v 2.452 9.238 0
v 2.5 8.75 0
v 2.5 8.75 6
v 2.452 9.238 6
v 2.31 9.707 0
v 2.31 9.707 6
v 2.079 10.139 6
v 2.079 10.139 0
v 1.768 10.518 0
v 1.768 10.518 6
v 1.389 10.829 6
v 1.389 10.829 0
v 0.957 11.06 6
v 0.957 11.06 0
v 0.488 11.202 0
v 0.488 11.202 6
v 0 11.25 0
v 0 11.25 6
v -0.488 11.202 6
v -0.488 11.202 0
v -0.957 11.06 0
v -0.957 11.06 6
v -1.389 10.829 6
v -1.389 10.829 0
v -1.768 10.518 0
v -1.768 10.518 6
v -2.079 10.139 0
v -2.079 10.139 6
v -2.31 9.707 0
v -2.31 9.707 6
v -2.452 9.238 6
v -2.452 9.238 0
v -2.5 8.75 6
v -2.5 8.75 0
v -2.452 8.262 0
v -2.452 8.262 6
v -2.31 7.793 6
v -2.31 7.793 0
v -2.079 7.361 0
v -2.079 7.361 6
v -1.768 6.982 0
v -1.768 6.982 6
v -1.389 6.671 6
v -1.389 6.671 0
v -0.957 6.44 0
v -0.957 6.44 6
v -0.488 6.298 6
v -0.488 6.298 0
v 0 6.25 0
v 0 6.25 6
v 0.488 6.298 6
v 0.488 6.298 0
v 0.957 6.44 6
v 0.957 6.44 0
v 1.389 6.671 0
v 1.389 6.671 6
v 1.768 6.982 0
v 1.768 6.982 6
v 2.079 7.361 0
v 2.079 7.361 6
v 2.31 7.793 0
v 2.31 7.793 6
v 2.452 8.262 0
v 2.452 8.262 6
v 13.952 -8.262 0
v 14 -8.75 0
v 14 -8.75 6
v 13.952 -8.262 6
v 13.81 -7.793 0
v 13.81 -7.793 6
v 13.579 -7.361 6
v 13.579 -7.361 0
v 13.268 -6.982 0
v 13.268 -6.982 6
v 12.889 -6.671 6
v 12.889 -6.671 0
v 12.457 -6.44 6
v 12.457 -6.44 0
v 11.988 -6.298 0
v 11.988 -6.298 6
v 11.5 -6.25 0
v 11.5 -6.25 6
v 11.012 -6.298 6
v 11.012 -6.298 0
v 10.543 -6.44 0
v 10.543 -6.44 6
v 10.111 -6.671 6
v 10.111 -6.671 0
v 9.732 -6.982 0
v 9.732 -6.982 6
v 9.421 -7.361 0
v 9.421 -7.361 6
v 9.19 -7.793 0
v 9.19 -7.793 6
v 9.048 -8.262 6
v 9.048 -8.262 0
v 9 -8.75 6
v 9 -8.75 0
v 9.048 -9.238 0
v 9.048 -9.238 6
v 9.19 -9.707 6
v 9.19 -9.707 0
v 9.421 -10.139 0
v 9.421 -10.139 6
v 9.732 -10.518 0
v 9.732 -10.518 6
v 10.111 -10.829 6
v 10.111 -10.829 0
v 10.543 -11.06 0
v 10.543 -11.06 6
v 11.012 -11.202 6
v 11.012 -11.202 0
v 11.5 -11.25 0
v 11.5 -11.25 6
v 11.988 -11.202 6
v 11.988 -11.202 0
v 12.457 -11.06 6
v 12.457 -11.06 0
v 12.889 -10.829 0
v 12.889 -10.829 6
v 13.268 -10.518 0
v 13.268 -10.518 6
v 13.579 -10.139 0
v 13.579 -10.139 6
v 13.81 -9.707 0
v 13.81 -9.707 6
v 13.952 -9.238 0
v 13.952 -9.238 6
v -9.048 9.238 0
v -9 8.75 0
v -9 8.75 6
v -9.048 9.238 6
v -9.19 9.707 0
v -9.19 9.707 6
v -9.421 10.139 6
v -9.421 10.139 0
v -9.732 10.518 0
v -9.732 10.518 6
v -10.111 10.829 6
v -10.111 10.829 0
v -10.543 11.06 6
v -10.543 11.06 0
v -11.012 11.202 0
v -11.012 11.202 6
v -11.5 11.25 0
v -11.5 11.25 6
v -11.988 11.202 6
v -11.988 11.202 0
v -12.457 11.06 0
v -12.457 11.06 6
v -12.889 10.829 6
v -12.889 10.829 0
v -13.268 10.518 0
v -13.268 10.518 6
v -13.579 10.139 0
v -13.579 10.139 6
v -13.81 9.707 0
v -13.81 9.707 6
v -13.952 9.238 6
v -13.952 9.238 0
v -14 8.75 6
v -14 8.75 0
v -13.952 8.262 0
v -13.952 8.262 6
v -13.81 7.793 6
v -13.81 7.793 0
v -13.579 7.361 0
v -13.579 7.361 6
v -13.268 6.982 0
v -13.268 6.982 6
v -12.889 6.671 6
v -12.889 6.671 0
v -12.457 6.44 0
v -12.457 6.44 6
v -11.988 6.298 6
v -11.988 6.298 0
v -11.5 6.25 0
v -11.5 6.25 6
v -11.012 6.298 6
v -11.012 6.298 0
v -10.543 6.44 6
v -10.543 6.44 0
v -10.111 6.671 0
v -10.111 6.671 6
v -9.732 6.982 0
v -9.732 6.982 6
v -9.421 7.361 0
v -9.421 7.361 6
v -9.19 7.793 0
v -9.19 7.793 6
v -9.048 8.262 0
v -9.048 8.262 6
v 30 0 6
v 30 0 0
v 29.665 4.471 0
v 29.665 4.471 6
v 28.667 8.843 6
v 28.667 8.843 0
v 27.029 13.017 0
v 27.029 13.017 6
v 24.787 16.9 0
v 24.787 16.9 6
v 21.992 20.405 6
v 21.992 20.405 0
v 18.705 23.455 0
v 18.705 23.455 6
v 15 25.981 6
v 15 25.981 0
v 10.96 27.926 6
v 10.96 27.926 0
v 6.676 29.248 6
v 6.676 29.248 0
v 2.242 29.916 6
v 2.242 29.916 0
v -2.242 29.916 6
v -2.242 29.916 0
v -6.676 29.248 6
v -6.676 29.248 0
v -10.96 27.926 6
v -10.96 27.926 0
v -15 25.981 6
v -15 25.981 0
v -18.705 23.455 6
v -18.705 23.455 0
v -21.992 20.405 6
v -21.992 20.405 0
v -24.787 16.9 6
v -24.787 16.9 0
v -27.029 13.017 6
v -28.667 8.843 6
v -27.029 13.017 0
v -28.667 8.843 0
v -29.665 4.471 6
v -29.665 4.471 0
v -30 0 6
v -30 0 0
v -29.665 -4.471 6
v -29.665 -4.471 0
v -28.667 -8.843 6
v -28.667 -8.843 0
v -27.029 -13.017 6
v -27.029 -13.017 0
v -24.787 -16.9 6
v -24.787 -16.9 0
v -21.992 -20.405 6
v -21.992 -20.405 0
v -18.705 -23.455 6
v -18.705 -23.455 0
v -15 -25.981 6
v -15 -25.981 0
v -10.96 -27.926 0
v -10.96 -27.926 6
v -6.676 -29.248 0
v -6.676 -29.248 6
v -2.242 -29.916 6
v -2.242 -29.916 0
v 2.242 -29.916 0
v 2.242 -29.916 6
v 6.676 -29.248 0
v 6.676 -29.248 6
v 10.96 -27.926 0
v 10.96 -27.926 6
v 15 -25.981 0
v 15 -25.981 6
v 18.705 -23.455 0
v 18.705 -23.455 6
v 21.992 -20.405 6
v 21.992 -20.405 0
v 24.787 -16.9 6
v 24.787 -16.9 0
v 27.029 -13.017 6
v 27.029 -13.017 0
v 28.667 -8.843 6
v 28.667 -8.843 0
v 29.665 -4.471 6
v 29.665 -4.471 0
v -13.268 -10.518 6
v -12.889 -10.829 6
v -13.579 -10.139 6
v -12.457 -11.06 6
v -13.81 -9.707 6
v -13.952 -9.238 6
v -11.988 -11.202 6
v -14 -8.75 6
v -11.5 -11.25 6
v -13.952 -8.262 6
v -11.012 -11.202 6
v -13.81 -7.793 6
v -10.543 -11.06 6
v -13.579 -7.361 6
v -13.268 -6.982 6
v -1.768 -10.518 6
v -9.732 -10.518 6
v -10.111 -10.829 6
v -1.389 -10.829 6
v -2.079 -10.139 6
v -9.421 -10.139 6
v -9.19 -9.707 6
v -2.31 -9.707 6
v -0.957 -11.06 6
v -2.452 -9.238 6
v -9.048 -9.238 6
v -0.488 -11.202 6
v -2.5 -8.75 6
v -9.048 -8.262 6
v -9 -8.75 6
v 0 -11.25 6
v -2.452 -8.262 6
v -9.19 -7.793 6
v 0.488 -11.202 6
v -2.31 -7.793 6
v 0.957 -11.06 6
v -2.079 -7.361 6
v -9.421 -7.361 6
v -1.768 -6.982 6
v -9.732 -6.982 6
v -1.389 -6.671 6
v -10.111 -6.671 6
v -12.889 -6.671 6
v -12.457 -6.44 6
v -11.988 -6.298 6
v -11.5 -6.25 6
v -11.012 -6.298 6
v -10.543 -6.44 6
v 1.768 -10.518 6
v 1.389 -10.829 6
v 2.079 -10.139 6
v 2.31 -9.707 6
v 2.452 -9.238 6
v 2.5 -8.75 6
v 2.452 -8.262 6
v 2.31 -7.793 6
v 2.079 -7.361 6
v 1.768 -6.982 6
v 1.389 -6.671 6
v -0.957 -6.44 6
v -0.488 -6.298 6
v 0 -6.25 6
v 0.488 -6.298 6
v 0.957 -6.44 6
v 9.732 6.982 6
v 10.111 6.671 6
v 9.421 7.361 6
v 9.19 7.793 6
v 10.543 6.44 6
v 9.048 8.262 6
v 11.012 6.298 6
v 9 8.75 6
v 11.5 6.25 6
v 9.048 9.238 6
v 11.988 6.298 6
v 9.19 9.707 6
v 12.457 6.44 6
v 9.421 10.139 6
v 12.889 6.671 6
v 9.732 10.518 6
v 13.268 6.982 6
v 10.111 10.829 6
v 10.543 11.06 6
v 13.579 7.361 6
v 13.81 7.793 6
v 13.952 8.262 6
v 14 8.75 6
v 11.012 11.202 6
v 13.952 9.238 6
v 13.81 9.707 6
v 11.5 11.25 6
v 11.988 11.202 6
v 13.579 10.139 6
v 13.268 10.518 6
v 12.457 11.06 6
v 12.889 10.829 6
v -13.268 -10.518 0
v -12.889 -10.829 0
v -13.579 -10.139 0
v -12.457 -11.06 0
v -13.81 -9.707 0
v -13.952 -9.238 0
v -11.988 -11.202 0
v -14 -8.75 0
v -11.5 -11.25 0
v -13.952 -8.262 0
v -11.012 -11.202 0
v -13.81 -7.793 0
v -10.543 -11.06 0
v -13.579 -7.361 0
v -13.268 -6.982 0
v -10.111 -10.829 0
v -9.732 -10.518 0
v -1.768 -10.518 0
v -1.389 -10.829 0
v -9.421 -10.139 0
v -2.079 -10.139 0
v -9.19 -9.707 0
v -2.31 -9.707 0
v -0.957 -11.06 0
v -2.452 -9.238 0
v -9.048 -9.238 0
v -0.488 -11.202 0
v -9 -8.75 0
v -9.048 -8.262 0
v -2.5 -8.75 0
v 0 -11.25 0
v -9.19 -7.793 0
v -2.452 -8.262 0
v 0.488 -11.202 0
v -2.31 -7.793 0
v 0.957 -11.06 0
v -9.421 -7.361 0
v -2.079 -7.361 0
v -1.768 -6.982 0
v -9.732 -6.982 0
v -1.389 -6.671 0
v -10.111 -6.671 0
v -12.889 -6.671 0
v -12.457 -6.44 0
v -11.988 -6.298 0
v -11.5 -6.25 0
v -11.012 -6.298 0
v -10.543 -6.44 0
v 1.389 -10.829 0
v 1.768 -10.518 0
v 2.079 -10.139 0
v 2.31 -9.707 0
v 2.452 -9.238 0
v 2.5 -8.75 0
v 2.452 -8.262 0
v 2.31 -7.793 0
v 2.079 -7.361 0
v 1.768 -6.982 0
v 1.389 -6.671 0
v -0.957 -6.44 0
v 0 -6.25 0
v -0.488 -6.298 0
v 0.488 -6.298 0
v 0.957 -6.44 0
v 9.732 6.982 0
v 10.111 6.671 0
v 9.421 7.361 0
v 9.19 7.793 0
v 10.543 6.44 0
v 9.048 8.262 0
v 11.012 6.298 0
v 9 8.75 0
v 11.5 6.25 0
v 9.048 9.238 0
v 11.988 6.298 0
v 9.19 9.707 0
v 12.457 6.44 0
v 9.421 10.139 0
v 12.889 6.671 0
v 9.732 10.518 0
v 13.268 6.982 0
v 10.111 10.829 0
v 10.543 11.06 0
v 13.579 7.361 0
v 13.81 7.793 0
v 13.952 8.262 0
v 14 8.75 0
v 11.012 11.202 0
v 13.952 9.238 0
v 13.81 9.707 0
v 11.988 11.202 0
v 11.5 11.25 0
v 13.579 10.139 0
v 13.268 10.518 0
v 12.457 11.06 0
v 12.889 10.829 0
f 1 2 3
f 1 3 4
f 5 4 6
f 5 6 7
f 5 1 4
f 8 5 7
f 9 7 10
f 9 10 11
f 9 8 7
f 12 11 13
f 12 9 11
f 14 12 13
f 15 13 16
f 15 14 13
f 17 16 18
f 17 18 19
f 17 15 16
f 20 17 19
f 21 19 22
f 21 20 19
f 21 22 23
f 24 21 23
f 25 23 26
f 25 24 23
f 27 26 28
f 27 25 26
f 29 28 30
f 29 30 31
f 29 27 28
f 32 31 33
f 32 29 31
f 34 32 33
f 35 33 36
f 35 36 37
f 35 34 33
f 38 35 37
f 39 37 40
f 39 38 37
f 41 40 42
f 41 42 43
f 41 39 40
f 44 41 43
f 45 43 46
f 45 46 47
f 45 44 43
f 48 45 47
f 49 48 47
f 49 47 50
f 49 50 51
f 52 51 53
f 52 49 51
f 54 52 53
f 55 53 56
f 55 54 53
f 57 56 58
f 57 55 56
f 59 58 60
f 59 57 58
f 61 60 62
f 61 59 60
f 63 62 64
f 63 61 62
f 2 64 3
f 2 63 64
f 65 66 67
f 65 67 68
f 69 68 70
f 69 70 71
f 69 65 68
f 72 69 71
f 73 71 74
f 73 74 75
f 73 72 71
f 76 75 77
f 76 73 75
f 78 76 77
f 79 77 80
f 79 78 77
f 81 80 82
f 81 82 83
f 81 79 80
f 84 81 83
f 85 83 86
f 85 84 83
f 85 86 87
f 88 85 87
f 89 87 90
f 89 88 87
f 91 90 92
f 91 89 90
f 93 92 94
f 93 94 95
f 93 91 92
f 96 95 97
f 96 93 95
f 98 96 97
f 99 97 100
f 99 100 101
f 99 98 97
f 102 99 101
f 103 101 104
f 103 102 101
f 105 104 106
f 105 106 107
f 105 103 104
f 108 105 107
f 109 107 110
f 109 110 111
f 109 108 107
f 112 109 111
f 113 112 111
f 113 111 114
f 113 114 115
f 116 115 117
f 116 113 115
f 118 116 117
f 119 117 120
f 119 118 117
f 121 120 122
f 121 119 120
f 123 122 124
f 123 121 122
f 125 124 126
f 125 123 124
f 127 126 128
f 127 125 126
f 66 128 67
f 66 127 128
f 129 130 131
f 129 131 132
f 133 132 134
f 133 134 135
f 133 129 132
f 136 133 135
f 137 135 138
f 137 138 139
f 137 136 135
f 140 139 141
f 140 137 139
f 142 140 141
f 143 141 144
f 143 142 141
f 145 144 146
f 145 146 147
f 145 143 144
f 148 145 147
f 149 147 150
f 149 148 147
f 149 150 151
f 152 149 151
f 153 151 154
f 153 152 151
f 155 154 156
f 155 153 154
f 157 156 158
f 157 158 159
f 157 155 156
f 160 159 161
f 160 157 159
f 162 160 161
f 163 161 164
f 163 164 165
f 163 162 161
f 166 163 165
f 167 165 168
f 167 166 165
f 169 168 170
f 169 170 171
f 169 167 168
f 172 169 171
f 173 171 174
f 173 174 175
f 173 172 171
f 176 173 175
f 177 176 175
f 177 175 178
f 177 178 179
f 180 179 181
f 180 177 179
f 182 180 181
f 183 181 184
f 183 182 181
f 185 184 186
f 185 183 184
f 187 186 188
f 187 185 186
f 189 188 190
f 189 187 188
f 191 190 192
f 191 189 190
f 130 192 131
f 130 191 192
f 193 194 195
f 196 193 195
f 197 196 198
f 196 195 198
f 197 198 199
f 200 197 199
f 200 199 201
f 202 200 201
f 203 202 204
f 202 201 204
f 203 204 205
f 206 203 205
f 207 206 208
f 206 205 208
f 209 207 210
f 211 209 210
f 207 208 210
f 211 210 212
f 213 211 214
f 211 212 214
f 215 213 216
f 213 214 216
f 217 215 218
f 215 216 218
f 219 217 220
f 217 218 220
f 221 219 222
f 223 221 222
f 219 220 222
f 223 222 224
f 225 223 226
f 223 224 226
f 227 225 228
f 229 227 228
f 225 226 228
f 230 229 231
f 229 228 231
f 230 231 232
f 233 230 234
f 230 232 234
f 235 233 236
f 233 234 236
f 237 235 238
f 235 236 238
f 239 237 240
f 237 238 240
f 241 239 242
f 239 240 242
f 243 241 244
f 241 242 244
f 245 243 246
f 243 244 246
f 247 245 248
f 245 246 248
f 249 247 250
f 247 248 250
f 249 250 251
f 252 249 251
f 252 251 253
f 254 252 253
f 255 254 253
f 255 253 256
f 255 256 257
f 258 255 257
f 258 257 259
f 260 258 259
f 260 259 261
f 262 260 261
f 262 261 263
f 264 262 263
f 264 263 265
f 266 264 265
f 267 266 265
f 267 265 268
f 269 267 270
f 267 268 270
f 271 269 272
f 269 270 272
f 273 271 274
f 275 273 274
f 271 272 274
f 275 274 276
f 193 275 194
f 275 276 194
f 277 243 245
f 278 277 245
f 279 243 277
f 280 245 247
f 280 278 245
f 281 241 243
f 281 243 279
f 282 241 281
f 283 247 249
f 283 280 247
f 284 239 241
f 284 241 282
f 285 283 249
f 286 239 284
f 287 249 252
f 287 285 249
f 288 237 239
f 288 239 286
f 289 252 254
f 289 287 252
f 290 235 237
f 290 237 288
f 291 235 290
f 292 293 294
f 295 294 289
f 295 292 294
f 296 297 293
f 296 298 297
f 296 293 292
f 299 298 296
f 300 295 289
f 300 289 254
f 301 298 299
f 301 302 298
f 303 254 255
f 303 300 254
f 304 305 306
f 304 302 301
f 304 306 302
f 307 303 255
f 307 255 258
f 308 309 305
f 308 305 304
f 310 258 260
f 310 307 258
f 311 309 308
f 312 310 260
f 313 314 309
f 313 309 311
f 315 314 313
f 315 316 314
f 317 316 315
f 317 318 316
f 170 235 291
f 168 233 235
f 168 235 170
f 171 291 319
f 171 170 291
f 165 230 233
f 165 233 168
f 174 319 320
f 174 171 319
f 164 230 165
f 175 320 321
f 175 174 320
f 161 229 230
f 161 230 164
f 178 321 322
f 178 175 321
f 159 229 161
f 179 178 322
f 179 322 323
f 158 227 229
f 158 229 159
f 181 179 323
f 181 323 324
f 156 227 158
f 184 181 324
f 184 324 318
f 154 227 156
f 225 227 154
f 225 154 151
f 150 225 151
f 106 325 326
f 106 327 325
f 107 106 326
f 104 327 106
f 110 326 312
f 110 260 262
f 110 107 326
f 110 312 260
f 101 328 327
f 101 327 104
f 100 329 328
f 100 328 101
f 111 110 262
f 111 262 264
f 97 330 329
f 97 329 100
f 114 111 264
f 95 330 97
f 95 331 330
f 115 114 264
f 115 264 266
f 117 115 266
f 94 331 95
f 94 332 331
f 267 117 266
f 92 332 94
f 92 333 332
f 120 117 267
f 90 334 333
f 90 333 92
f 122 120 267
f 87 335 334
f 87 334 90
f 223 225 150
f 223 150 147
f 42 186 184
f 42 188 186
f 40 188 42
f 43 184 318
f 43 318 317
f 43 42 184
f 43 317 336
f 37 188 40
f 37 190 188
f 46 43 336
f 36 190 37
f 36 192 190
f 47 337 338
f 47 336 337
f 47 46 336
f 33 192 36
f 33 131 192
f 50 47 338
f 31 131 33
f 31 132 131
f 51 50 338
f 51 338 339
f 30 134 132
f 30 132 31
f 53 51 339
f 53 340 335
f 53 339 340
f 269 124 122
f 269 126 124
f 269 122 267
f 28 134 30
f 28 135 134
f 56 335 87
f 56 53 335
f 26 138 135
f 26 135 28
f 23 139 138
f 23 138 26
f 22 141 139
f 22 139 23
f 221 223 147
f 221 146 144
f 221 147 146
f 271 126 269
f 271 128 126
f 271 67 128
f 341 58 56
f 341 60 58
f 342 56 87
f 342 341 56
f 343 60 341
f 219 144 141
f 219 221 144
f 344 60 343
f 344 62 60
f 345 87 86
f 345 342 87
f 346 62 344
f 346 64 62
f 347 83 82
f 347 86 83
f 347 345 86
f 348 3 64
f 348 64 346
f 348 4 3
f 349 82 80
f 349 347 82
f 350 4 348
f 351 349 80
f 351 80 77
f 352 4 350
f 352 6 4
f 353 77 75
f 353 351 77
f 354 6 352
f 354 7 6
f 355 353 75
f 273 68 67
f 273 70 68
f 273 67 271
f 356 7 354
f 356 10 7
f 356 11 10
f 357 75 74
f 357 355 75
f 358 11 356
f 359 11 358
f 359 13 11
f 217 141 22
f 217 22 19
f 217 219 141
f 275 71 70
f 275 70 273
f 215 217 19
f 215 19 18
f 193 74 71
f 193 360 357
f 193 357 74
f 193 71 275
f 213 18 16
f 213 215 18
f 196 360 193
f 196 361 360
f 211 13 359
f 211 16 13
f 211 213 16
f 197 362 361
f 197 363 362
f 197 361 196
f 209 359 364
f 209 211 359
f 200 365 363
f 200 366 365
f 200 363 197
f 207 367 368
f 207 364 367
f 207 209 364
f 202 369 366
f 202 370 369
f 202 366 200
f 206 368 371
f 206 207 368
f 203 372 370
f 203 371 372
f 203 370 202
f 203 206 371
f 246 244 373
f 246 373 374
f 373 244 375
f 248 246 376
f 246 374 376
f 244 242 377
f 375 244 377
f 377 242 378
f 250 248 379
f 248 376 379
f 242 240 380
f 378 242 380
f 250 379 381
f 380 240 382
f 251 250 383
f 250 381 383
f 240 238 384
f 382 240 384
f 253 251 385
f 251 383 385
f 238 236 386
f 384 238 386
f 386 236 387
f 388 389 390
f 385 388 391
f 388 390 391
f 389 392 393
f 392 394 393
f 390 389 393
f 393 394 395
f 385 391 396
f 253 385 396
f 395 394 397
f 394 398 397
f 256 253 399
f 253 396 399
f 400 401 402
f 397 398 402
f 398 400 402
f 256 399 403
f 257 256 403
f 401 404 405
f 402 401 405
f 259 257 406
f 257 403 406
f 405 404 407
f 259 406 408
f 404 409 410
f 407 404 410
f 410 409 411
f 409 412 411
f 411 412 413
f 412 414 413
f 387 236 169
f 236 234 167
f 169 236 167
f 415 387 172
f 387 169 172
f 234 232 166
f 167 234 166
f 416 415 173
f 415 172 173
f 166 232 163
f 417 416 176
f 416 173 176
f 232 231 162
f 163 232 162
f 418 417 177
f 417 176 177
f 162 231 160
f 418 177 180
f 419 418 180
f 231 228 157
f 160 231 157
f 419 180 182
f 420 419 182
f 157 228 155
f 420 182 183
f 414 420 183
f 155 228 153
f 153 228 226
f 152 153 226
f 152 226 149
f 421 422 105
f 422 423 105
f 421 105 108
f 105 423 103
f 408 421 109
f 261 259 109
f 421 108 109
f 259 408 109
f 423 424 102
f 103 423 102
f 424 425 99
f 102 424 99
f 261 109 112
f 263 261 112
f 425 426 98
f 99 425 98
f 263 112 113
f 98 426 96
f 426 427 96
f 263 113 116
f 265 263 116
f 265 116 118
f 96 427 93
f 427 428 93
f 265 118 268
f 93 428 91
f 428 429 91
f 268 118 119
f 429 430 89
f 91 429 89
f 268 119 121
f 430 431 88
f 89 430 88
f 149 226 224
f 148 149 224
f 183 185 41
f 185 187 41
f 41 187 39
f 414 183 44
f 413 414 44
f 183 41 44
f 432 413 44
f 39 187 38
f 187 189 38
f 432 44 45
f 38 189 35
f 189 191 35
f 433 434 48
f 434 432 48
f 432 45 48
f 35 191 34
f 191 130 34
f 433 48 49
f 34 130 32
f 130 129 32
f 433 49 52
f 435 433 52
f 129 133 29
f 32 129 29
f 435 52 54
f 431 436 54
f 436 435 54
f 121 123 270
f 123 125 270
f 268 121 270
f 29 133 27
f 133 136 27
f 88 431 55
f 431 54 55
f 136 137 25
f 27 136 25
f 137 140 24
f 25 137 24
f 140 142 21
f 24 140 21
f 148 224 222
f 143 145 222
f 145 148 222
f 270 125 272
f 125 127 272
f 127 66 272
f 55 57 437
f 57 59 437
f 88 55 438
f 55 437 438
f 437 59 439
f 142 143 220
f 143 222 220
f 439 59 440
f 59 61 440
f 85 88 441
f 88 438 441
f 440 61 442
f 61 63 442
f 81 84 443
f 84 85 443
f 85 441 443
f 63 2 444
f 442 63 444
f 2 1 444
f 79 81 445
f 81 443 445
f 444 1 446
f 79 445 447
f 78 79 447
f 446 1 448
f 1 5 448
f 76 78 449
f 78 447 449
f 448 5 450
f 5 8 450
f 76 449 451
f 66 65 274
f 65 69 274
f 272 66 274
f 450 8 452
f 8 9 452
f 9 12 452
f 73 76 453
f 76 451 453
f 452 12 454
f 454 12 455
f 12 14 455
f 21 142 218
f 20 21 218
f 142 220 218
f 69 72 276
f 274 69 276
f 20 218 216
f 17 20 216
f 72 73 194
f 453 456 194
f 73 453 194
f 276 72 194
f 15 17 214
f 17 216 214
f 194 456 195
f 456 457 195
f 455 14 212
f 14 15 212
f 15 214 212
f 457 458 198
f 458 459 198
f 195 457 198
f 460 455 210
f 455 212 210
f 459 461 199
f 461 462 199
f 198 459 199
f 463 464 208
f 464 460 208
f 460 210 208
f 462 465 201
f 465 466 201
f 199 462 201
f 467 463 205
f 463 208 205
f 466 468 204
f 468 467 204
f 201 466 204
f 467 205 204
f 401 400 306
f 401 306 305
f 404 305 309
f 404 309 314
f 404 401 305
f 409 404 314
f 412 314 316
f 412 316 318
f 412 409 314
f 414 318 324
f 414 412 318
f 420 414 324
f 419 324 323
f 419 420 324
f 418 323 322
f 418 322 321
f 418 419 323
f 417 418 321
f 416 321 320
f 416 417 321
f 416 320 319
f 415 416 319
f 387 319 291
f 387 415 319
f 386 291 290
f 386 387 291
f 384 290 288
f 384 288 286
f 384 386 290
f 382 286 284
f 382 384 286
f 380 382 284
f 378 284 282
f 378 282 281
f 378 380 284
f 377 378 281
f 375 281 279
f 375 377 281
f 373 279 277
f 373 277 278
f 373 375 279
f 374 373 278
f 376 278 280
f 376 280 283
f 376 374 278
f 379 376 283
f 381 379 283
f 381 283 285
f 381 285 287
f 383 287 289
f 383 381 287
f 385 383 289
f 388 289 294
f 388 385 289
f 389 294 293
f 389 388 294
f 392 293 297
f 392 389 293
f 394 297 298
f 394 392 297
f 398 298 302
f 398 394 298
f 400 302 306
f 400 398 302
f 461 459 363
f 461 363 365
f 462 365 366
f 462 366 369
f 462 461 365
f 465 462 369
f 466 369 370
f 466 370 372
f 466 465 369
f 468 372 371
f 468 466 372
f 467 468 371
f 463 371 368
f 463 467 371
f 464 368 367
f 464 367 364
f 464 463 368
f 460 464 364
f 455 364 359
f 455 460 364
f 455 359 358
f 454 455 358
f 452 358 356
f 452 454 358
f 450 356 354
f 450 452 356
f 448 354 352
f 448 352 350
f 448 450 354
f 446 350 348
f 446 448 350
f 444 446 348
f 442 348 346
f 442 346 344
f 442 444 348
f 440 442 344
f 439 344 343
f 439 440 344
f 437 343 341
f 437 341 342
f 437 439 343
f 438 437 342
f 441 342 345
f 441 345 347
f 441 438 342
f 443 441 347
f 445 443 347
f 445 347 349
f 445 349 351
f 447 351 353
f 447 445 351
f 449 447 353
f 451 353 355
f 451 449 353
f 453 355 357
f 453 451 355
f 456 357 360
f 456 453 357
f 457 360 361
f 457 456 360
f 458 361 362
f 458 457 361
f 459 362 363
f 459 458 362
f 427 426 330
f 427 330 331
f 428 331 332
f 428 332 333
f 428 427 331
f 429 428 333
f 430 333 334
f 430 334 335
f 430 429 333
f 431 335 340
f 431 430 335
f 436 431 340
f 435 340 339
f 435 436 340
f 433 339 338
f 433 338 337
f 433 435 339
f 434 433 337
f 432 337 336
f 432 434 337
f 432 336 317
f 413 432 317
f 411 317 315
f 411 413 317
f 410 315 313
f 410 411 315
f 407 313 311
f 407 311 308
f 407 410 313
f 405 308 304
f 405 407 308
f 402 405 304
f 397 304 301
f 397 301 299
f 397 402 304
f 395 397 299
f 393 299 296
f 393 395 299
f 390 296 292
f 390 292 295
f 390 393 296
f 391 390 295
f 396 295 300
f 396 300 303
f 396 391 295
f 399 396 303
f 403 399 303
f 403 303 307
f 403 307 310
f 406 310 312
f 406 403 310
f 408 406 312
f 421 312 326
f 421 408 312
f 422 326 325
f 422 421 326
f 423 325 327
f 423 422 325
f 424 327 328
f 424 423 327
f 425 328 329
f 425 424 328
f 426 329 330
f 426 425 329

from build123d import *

# Parameters (mm, degrees)
F0_R     = 30
F0_R_2   = 2.5
F1_DEPTH = 6


with BuildPart() as f1:
    # F0 (on Top) → F1 (new body)
    with BuildSketch(Plane.XY):
        Circle(F0_R)
        with Locations((-11.5, -8.75)):
            Circle(F0_R_2, mode=Mode.SUBTRACT)
        with Locations((0, -8.75)):
            Circle(F0_R_2, mode=Mode.SUBTRACT)
        with Locations((11.5, -8.75)):
            Circle(F0_R_2, mode=Mode.SUBTRACT)
        with Locations((-11.5, 8.75)):
            Circle(F0_R_2, mode=Mode.SUBTRACT)
        with Locations((0, 8.75)):
            Circle(F0_R_2, mode=Mode.SUBTRACT)
        with Locations((11.5, 8.75)):
            Circle(F0_R_2, mode=Mode.SUBTRACT)
    extrude(amount=F1_DEPTH)


solid = f1.part
